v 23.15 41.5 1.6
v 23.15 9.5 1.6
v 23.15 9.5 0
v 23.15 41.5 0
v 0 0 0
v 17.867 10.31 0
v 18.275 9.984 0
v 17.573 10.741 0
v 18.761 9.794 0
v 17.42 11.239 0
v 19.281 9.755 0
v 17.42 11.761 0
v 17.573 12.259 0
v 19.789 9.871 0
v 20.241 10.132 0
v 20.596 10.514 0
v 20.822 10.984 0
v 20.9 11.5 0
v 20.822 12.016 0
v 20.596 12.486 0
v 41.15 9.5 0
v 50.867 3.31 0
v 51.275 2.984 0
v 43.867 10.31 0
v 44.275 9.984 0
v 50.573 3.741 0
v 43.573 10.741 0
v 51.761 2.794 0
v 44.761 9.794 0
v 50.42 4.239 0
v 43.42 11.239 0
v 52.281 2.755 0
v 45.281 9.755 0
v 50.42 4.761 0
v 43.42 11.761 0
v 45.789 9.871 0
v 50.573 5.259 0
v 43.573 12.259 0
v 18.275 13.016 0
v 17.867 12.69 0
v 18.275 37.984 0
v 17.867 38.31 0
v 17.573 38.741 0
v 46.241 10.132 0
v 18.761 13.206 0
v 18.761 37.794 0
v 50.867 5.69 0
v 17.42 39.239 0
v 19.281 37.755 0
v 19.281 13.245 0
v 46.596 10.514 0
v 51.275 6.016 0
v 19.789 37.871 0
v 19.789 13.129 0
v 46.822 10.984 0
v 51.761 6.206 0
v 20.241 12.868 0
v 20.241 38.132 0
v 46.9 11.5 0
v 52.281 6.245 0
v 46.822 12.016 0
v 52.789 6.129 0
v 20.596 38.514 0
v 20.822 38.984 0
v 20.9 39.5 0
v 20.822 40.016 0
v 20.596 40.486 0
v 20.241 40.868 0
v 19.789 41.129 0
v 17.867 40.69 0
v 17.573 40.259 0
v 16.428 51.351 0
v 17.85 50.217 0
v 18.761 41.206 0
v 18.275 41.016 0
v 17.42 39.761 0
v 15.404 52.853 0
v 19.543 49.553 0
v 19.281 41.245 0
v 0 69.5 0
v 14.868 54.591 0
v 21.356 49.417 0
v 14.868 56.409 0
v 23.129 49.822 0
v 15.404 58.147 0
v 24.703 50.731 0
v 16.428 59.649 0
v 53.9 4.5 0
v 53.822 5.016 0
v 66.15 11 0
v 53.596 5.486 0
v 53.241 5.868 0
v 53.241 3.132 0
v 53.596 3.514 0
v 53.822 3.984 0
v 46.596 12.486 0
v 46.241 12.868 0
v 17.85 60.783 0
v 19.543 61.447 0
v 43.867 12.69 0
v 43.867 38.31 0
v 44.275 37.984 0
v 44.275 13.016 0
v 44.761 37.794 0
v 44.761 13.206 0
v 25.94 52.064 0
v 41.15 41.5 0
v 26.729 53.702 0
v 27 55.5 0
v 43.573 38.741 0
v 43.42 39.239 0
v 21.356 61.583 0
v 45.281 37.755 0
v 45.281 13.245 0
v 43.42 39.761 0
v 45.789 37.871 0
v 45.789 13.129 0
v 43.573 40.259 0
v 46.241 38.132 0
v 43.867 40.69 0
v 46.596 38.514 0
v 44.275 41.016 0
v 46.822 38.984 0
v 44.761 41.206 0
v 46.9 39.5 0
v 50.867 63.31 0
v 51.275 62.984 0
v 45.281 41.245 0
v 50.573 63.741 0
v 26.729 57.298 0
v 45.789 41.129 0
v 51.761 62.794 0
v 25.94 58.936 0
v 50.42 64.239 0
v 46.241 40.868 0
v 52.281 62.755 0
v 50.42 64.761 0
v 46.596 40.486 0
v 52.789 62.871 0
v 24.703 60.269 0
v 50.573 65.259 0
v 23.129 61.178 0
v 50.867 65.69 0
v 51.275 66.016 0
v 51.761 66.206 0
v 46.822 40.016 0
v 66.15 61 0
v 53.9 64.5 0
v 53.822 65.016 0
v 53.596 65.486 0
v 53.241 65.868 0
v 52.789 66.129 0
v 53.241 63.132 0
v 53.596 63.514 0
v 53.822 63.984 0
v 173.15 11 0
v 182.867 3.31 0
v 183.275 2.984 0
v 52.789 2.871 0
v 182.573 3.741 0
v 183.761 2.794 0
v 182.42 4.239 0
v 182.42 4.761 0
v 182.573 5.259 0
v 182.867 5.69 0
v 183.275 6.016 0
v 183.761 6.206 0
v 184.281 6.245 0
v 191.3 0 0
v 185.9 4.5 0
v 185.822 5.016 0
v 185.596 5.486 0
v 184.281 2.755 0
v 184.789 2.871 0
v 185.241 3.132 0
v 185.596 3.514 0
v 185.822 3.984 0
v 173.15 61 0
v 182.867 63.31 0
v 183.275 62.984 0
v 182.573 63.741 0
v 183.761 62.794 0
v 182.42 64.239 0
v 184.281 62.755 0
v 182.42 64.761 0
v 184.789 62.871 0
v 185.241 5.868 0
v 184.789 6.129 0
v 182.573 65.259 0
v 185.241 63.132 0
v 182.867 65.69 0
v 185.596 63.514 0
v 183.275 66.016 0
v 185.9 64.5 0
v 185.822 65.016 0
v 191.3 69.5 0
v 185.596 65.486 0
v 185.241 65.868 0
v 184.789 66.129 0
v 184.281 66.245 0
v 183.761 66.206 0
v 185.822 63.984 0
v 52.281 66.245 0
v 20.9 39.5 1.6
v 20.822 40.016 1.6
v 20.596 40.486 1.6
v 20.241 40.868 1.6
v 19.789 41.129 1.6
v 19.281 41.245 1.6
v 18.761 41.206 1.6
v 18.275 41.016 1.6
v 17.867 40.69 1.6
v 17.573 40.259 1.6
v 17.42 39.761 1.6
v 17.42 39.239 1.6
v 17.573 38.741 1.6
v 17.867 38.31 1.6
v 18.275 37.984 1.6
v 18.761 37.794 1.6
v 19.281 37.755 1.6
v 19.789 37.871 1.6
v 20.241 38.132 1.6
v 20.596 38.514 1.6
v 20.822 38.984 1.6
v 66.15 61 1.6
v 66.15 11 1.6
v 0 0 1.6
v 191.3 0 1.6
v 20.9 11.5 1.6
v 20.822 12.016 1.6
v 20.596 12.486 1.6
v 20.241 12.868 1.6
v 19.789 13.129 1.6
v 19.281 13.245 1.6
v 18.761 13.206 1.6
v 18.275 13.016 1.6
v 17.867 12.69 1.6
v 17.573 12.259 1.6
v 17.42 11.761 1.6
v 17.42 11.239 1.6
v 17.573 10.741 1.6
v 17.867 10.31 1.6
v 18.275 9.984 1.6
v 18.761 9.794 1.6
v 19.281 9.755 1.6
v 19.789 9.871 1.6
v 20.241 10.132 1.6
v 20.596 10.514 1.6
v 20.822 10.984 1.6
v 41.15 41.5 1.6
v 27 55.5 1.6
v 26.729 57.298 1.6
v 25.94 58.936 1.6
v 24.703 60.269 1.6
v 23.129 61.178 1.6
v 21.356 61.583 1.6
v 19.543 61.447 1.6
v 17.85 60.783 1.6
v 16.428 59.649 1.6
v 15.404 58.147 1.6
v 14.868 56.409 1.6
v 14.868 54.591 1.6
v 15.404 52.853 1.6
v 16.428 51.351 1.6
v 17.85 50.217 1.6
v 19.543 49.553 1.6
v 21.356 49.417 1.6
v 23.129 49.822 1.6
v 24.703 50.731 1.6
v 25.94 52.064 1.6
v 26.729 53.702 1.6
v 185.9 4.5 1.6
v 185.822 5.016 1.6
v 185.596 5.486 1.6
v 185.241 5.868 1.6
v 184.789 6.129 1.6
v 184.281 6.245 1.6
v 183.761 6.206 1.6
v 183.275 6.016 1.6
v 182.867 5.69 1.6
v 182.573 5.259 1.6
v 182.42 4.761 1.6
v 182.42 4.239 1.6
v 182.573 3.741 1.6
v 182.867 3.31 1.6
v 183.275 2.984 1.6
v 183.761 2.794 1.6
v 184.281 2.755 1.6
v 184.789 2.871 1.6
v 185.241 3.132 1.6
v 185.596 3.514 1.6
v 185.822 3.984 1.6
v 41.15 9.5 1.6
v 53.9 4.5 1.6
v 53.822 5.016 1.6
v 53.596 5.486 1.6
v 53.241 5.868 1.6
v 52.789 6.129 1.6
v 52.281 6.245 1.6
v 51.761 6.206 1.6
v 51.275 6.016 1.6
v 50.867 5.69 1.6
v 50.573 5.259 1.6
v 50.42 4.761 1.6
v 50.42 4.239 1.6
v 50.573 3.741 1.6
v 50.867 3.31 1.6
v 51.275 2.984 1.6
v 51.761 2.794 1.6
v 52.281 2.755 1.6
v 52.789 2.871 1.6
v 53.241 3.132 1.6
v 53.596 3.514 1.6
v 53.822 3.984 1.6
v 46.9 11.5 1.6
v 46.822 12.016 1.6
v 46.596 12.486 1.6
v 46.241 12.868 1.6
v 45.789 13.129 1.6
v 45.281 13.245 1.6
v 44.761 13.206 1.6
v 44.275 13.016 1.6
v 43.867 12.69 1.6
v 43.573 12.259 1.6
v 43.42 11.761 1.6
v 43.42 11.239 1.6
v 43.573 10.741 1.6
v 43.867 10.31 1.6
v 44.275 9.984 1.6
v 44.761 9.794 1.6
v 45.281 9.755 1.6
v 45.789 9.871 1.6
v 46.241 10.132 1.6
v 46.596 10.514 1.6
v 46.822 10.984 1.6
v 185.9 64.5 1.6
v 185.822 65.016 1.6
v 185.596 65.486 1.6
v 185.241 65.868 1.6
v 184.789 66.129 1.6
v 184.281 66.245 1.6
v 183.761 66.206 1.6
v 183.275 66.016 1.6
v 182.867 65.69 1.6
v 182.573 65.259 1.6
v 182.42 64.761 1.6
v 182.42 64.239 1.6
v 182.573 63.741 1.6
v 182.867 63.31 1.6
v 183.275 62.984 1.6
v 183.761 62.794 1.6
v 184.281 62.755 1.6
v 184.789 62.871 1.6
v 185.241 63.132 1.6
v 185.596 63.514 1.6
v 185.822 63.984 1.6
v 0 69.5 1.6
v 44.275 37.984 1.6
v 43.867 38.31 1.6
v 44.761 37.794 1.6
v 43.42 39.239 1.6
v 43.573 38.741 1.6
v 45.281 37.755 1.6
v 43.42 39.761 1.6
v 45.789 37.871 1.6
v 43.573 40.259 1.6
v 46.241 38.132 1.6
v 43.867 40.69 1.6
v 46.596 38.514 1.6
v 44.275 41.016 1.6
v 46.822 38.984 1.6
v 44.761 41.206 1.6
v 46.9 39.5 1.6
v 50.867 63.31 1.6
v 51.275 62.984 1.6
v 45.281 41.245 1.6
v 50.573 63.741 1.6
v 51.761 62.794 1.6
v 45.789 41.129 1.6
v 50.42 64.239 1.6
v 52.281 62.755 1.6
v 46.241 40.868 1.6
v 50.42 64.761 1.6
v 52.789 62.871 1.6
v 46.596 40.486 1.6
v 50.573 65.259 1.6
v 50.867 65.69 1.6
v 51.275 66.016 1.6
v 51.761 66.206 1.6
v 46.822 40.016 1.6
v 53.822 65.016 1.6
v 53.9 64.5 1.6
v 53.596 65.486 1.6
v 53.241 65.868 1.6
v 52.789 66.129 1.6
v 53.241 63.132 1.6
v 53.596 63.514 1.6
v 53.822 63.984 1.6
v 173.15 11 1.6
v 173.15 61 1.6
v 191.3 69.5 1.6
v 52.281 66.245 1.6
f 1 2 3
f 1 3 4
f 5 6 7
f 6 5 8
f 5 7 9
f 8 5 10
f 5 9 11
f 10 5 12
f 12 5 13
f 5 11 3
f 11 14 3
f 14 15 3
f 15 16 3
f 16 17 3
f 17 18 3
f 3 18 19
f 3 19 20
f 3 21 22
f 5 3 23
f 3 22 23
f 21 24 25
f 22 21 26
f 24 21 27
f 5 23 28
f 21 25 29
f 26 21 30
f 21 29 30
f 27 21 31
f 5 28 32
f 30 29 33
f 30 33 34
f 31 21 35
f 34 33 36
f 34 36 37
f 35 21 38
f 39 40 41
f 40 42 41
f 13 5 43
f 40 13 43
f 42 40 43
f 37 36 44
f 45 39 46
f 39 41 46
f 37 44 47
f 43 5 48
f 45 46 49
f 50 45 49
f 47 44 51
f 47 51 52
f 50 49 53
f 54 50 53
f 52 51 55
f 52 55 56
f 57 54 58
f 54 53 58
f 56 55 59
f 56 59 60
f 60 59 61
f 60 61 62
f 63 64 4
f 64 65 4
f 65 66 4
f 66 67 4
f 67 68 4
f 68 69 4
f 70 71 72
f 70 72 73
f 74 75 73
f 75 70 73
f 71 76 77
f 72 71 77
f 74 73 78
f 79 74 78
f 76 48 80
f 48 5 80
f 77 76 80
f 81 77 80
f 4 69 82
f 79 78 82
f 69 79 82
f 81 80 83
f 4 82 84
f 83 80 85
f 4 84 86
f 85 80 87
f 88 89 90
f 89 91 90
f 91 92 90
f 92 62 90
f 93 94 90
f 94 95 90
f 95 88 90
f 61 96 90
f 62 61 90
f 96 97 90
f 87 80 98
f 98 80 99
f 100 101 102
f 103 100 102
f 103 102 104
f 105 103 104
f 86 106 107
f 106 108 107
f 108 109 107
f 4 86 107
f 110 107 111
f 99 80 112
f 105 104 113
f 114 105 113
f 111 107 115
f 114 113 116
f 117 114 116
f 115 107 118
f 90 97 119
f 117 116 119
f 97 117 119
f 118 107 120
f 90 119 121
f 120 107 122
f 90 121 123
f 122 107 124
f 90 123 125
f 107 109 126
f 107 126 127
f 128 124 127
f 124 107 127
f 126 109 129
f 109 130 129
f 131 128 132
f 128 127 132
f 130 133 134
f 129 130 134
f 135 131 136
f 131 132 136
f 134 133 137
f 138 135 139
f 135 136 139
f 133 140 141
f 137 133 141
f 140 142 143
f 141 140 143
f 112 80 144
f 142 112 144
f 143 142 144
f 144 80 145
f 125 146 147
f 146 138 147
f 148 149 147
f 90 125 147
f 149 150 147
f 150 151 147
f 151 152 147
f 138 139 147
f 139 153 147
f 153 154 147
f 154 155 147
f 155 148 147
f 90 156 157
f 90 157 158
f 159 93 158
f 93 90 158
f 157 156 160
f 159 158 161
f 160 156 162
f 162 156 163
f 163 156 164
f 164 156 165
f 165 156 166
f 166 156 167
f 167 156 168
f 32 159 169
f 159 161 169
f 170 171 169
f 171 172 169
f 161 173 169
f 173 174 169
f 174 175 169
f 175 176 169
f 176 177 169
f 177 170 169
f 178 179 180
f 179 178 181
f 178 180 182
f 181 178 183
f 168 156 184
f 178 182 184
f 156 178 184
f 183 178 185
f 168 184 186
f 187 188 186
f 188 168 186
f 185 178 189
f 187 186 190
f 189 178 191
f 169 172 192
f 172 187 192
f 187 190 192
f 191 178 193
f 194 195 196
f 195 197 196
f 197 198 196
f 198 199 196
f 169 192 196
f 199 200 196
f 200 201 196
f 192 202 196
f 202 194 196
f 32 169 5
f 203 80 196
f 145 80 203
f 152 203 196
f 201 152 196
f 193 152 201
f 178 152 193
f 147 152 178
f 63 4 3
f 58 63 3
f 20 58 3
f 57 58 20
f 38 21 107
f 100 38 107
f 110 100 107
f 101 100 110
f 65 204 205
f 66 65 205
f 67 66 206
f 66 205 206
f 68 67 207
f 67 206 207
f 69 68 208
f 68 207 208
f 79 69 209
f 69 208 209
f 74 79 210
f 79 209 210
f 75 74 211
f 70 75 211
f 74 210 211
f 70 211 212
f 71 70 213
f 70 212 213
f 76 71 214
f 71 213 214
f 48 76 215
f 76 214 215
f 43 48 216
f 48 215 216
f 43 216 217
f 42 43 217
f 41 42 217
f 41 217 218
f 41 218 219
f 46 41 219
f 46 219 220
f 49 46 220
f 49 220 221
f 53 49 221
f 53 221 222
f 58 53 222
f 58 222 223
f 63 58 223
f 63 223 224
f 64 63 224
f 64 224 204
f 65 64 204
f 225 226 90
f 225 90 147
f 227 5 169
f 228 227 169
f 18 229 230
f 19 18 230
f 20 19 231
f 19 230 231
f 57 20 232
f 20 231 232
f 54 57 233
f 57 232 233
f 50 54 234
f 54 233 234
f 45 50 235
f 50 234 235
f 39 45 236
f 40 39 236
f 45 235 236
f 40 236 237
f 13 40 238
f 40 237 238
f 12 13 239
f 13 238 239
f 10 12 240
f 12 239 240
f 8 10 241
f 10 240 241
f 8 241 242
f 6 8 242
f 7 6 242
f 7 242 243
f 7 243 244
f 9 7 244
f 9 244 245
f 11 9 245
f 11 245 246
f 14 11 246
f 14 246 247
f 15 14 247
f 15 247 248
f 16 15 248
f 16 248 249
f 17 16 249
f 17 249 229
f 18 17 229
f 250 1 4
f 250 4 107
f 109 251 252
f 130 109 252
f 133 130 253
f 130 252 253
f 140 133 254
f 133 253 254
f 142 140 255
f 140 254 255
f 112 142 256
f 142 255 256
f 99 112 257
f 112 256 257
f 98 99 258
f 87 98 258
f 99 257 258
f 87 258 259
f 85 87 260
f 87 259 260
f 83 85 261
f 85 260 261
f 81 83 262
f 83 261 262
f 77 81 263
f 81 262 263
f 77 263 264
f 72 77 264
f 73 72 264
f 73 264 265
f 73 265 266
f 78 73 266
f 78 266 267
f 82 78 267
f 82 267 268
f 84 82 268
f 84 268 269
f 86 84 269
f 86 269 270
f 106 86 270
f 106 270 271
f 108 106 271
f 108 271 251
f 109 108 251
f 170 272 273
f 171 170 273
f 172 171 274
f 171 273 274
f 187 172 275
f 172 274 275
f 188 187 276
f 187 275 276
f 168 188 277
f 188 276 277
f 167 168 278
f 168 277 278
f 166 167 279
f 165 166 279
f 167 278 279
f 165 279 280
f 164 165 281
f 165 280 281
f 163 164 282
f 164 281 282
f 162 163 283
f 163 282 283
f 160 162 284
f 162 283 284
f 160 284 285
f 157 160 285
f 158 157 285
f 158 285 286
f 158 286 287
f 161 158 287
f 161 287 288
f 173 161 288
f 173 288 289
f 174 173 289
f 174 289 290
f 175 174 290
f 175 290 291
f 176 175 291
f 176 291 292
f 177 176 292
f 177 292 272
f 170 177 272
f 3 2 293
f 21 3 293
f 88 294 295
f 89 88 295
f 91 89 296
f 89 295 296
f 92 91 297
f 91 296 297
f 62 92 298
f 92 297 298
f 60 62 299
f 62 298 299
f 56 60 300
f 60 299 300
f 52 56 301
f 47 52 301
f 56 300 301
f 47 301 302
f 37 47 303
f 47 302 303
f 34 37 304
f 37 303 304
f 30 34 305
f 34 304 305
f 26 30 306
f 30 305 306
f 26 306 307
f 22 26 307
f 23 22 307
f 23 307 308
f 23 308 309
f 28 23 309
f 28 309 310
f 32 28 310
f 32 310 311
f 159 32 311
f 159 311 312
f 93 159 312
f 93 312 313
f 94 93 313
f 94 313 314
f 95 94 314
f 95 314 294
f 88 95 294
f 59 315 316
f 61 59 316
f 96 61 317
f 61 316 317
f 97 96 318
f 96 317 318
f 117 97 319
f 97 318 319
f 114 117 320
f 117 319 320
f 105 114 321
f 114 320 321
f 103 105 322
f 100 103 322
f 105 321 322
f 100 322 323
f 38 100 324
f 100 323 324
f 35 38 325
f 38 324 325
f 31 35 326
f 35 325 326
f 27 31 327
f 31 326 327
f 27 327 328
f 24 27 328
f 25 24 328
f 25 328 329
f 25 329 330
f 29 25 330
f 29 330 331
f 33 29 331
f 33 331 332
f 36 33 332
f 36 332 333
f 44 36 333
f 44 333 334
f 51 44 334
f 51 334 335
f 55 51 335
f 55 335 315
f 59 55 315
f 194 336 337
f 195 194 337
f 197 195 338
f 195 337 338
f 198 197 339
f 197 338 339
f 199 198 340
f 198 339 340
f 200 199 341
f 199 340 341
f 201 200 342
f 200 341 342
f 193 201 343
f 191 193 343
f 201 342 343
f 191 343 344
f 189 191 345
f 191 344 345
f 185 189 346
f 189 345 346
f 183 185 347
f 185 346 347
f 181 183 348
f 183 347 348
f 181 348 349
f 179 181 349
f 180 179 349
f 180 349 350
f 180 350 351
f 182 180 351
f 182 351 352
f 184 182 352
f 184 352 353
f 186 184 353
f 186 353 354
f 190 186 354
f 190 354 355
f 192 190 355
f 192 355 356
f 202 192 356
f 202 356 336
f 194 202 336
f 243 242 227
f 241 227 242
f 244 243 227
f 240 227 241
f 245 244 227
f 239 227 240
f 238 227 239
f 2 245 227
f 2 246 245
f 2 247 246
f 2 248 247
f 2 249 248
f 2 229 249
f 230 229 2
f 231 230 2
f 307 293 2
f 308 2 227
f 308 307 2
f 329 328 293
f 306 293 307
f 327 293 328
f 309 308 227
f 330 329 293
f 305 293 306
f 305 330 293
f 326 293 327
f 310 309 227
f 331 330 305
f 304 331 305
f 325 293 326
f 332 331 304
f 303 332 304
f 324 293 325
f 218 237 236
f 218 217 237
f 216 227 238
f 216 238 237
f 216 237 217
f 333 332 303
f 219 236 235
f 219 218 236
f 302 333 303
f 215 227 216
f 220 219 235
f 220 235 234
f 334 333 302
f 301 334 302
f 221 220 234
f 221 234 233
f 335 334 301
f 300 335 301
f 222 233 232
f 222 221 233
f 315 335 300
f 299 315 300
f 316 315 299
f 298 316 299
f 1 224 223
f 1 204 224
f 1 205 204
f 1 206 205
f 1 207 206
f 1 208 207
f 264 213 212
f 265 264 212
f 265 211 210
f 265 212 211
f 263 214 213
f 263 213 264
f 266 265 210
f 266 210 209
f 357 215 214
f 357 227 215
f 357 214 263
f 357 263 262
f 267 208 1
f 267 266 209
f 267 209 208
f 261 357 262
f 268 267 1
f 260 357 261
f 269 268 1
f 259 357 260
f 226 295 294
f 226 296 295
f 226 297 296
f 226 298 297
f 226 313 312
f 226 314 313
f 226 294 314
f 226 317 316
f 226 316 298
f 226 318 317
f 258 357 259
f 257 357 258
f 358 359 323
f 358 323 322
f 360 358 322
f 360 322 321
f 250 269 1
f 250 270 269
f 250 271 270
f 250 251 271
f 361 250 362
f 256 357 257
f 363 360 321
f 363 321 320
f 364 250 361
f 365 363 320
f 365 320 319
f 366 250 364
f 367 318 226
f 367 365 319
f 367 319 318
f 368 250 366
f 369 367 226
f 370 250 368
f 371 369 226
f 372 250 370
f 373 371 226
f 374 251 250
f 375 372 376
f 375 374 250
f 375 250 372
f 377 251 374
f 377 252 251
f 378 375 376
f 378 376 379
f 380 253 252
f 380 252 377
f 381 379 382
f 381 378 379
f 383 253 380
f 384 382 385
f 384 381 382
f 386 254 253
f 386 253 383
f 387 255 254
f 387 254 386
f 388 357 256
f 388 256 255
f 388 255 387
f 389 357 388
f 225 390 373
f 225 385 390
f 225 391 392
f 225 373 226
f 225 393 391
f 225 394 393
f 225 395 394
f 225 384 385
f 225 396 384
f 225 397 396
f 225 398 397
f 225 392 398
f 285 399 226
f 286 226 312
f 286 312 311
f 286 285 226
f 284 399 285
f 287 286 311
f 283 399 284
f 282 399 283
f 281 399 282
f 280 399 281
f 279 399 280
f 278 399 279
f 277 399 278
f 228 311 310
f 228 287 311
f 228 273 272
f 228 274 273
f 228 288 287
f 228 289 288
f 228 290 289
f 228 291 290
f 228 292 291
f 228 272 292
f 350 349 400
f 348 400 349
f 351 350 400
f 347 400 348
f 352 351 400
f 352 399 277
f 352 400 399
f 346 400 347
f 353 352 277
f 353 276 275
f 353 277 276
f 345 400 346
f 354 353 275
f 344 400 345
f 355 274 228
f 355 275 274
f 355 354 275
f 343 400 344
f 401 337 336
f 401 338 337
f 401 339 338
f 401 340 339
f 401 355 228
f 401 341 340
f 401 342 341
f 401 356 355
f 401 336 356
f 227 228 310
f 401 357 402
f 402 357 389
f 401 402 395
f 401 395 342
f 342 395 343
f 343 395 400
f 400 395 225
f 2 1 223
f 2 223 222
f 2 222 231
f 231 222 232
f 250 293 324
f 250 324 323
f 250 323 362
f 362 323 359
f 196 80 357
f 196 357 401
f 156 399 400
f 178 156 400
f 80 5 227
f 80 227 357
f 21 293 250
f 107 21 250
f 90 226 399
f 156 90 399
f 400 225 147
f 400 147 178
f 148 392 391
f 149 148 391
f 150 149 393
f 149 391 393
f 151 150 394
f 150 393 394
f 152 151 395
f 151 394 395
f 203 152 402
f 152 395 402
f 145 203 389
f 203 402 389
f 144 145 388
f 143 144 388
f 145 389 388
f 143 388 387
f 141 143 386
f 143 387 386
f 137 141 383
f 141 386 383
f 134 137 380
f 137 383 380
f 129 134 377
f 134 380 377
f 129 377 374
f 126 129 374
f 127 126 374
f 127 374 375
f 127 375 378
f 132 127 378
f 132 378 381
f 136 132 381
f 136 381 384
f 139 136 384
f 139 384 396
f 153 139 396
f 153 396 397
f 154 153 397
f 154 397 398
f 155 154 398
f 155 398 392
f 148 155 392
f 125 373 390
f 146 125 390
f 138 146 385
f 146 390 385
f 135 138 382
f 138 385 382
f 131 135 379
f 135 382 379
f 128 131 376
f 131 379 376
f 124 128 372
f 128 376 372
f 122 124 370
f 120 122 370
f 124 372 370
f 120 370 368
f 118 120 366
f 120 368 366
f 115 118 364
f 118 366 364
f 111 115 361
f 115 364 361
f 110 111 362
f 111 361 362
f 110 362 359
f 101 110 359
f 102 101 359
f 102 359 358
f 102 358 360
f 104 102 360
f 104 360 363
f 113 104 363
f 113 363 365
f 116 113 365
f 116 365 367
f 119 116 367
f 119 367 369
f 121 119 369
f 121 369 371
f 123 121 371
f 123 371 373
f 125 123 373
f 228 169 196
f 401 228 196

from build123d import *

# Parameters (mm, degrees)
SKETCH_W      = 191.3
SKETCH_H      = 69.5
PAD_DEPTH     = 1.6
SKETCH002_R   = 1.75
SKETCH002_R_2 = 6.1
SKETCH002_W   = 107
SKETCH002_H   = 50
SKETCH002_W_2 = 18
SKETCH002_H_2 = 32
POCKET_DEPTH  = 1.601


with BuildPart() as part:
    # Sketch → Pad (new body)
    with BuildSketch(Plane.XY):
        with Locations((95.65, 34.75)):
            Rectangle(SKETCH_W, SKETCH_H)
    extrude(amount=PAD_DEPTH)

    # Sketch002 (on Face6 of Pad) → Pocket (cut, through all)
    with BuildSketch(Plane.XY.offset(1.6)):
        with Locations((184.15, 4.5)):
            Circle(SKETCH002_R)
        with Locations((52.15, 4.5)):
            Circle(SKETCH002_R)
        with Locations((184.15, 64.5)):
            Circle(SKETCH002_R)
        with Locations((52.15, 64.5)):
            Circle(SKETCH002_R)
        with Locations((19.15, 11.5)):
            Circle(SKETCH002_R)
        with Locations((19.15, 39.5)):
            Circle(SKETCH002_R)
        with Locations((45.15, 11.5)):
            Circle(SKETCH002_R)
        with Locations((45.15, 39.5)):
            Circle(SKETCH002_R)
        with Locations((20.9, 55.5)):
            Circle(SKETCH002_R_2)
        with Locations((119.65, 36)):
            Rectangle(SKETCH002_W, SKETCH002_H)
        with Locations((32.15, 25.5)):
            Rectangle(SKETCH002_W_2, SKETCH002_H_2)
    extrude(amount=-POCKET_DEPTH, mode=Mode.SUBTRACT)


solid = part.part
